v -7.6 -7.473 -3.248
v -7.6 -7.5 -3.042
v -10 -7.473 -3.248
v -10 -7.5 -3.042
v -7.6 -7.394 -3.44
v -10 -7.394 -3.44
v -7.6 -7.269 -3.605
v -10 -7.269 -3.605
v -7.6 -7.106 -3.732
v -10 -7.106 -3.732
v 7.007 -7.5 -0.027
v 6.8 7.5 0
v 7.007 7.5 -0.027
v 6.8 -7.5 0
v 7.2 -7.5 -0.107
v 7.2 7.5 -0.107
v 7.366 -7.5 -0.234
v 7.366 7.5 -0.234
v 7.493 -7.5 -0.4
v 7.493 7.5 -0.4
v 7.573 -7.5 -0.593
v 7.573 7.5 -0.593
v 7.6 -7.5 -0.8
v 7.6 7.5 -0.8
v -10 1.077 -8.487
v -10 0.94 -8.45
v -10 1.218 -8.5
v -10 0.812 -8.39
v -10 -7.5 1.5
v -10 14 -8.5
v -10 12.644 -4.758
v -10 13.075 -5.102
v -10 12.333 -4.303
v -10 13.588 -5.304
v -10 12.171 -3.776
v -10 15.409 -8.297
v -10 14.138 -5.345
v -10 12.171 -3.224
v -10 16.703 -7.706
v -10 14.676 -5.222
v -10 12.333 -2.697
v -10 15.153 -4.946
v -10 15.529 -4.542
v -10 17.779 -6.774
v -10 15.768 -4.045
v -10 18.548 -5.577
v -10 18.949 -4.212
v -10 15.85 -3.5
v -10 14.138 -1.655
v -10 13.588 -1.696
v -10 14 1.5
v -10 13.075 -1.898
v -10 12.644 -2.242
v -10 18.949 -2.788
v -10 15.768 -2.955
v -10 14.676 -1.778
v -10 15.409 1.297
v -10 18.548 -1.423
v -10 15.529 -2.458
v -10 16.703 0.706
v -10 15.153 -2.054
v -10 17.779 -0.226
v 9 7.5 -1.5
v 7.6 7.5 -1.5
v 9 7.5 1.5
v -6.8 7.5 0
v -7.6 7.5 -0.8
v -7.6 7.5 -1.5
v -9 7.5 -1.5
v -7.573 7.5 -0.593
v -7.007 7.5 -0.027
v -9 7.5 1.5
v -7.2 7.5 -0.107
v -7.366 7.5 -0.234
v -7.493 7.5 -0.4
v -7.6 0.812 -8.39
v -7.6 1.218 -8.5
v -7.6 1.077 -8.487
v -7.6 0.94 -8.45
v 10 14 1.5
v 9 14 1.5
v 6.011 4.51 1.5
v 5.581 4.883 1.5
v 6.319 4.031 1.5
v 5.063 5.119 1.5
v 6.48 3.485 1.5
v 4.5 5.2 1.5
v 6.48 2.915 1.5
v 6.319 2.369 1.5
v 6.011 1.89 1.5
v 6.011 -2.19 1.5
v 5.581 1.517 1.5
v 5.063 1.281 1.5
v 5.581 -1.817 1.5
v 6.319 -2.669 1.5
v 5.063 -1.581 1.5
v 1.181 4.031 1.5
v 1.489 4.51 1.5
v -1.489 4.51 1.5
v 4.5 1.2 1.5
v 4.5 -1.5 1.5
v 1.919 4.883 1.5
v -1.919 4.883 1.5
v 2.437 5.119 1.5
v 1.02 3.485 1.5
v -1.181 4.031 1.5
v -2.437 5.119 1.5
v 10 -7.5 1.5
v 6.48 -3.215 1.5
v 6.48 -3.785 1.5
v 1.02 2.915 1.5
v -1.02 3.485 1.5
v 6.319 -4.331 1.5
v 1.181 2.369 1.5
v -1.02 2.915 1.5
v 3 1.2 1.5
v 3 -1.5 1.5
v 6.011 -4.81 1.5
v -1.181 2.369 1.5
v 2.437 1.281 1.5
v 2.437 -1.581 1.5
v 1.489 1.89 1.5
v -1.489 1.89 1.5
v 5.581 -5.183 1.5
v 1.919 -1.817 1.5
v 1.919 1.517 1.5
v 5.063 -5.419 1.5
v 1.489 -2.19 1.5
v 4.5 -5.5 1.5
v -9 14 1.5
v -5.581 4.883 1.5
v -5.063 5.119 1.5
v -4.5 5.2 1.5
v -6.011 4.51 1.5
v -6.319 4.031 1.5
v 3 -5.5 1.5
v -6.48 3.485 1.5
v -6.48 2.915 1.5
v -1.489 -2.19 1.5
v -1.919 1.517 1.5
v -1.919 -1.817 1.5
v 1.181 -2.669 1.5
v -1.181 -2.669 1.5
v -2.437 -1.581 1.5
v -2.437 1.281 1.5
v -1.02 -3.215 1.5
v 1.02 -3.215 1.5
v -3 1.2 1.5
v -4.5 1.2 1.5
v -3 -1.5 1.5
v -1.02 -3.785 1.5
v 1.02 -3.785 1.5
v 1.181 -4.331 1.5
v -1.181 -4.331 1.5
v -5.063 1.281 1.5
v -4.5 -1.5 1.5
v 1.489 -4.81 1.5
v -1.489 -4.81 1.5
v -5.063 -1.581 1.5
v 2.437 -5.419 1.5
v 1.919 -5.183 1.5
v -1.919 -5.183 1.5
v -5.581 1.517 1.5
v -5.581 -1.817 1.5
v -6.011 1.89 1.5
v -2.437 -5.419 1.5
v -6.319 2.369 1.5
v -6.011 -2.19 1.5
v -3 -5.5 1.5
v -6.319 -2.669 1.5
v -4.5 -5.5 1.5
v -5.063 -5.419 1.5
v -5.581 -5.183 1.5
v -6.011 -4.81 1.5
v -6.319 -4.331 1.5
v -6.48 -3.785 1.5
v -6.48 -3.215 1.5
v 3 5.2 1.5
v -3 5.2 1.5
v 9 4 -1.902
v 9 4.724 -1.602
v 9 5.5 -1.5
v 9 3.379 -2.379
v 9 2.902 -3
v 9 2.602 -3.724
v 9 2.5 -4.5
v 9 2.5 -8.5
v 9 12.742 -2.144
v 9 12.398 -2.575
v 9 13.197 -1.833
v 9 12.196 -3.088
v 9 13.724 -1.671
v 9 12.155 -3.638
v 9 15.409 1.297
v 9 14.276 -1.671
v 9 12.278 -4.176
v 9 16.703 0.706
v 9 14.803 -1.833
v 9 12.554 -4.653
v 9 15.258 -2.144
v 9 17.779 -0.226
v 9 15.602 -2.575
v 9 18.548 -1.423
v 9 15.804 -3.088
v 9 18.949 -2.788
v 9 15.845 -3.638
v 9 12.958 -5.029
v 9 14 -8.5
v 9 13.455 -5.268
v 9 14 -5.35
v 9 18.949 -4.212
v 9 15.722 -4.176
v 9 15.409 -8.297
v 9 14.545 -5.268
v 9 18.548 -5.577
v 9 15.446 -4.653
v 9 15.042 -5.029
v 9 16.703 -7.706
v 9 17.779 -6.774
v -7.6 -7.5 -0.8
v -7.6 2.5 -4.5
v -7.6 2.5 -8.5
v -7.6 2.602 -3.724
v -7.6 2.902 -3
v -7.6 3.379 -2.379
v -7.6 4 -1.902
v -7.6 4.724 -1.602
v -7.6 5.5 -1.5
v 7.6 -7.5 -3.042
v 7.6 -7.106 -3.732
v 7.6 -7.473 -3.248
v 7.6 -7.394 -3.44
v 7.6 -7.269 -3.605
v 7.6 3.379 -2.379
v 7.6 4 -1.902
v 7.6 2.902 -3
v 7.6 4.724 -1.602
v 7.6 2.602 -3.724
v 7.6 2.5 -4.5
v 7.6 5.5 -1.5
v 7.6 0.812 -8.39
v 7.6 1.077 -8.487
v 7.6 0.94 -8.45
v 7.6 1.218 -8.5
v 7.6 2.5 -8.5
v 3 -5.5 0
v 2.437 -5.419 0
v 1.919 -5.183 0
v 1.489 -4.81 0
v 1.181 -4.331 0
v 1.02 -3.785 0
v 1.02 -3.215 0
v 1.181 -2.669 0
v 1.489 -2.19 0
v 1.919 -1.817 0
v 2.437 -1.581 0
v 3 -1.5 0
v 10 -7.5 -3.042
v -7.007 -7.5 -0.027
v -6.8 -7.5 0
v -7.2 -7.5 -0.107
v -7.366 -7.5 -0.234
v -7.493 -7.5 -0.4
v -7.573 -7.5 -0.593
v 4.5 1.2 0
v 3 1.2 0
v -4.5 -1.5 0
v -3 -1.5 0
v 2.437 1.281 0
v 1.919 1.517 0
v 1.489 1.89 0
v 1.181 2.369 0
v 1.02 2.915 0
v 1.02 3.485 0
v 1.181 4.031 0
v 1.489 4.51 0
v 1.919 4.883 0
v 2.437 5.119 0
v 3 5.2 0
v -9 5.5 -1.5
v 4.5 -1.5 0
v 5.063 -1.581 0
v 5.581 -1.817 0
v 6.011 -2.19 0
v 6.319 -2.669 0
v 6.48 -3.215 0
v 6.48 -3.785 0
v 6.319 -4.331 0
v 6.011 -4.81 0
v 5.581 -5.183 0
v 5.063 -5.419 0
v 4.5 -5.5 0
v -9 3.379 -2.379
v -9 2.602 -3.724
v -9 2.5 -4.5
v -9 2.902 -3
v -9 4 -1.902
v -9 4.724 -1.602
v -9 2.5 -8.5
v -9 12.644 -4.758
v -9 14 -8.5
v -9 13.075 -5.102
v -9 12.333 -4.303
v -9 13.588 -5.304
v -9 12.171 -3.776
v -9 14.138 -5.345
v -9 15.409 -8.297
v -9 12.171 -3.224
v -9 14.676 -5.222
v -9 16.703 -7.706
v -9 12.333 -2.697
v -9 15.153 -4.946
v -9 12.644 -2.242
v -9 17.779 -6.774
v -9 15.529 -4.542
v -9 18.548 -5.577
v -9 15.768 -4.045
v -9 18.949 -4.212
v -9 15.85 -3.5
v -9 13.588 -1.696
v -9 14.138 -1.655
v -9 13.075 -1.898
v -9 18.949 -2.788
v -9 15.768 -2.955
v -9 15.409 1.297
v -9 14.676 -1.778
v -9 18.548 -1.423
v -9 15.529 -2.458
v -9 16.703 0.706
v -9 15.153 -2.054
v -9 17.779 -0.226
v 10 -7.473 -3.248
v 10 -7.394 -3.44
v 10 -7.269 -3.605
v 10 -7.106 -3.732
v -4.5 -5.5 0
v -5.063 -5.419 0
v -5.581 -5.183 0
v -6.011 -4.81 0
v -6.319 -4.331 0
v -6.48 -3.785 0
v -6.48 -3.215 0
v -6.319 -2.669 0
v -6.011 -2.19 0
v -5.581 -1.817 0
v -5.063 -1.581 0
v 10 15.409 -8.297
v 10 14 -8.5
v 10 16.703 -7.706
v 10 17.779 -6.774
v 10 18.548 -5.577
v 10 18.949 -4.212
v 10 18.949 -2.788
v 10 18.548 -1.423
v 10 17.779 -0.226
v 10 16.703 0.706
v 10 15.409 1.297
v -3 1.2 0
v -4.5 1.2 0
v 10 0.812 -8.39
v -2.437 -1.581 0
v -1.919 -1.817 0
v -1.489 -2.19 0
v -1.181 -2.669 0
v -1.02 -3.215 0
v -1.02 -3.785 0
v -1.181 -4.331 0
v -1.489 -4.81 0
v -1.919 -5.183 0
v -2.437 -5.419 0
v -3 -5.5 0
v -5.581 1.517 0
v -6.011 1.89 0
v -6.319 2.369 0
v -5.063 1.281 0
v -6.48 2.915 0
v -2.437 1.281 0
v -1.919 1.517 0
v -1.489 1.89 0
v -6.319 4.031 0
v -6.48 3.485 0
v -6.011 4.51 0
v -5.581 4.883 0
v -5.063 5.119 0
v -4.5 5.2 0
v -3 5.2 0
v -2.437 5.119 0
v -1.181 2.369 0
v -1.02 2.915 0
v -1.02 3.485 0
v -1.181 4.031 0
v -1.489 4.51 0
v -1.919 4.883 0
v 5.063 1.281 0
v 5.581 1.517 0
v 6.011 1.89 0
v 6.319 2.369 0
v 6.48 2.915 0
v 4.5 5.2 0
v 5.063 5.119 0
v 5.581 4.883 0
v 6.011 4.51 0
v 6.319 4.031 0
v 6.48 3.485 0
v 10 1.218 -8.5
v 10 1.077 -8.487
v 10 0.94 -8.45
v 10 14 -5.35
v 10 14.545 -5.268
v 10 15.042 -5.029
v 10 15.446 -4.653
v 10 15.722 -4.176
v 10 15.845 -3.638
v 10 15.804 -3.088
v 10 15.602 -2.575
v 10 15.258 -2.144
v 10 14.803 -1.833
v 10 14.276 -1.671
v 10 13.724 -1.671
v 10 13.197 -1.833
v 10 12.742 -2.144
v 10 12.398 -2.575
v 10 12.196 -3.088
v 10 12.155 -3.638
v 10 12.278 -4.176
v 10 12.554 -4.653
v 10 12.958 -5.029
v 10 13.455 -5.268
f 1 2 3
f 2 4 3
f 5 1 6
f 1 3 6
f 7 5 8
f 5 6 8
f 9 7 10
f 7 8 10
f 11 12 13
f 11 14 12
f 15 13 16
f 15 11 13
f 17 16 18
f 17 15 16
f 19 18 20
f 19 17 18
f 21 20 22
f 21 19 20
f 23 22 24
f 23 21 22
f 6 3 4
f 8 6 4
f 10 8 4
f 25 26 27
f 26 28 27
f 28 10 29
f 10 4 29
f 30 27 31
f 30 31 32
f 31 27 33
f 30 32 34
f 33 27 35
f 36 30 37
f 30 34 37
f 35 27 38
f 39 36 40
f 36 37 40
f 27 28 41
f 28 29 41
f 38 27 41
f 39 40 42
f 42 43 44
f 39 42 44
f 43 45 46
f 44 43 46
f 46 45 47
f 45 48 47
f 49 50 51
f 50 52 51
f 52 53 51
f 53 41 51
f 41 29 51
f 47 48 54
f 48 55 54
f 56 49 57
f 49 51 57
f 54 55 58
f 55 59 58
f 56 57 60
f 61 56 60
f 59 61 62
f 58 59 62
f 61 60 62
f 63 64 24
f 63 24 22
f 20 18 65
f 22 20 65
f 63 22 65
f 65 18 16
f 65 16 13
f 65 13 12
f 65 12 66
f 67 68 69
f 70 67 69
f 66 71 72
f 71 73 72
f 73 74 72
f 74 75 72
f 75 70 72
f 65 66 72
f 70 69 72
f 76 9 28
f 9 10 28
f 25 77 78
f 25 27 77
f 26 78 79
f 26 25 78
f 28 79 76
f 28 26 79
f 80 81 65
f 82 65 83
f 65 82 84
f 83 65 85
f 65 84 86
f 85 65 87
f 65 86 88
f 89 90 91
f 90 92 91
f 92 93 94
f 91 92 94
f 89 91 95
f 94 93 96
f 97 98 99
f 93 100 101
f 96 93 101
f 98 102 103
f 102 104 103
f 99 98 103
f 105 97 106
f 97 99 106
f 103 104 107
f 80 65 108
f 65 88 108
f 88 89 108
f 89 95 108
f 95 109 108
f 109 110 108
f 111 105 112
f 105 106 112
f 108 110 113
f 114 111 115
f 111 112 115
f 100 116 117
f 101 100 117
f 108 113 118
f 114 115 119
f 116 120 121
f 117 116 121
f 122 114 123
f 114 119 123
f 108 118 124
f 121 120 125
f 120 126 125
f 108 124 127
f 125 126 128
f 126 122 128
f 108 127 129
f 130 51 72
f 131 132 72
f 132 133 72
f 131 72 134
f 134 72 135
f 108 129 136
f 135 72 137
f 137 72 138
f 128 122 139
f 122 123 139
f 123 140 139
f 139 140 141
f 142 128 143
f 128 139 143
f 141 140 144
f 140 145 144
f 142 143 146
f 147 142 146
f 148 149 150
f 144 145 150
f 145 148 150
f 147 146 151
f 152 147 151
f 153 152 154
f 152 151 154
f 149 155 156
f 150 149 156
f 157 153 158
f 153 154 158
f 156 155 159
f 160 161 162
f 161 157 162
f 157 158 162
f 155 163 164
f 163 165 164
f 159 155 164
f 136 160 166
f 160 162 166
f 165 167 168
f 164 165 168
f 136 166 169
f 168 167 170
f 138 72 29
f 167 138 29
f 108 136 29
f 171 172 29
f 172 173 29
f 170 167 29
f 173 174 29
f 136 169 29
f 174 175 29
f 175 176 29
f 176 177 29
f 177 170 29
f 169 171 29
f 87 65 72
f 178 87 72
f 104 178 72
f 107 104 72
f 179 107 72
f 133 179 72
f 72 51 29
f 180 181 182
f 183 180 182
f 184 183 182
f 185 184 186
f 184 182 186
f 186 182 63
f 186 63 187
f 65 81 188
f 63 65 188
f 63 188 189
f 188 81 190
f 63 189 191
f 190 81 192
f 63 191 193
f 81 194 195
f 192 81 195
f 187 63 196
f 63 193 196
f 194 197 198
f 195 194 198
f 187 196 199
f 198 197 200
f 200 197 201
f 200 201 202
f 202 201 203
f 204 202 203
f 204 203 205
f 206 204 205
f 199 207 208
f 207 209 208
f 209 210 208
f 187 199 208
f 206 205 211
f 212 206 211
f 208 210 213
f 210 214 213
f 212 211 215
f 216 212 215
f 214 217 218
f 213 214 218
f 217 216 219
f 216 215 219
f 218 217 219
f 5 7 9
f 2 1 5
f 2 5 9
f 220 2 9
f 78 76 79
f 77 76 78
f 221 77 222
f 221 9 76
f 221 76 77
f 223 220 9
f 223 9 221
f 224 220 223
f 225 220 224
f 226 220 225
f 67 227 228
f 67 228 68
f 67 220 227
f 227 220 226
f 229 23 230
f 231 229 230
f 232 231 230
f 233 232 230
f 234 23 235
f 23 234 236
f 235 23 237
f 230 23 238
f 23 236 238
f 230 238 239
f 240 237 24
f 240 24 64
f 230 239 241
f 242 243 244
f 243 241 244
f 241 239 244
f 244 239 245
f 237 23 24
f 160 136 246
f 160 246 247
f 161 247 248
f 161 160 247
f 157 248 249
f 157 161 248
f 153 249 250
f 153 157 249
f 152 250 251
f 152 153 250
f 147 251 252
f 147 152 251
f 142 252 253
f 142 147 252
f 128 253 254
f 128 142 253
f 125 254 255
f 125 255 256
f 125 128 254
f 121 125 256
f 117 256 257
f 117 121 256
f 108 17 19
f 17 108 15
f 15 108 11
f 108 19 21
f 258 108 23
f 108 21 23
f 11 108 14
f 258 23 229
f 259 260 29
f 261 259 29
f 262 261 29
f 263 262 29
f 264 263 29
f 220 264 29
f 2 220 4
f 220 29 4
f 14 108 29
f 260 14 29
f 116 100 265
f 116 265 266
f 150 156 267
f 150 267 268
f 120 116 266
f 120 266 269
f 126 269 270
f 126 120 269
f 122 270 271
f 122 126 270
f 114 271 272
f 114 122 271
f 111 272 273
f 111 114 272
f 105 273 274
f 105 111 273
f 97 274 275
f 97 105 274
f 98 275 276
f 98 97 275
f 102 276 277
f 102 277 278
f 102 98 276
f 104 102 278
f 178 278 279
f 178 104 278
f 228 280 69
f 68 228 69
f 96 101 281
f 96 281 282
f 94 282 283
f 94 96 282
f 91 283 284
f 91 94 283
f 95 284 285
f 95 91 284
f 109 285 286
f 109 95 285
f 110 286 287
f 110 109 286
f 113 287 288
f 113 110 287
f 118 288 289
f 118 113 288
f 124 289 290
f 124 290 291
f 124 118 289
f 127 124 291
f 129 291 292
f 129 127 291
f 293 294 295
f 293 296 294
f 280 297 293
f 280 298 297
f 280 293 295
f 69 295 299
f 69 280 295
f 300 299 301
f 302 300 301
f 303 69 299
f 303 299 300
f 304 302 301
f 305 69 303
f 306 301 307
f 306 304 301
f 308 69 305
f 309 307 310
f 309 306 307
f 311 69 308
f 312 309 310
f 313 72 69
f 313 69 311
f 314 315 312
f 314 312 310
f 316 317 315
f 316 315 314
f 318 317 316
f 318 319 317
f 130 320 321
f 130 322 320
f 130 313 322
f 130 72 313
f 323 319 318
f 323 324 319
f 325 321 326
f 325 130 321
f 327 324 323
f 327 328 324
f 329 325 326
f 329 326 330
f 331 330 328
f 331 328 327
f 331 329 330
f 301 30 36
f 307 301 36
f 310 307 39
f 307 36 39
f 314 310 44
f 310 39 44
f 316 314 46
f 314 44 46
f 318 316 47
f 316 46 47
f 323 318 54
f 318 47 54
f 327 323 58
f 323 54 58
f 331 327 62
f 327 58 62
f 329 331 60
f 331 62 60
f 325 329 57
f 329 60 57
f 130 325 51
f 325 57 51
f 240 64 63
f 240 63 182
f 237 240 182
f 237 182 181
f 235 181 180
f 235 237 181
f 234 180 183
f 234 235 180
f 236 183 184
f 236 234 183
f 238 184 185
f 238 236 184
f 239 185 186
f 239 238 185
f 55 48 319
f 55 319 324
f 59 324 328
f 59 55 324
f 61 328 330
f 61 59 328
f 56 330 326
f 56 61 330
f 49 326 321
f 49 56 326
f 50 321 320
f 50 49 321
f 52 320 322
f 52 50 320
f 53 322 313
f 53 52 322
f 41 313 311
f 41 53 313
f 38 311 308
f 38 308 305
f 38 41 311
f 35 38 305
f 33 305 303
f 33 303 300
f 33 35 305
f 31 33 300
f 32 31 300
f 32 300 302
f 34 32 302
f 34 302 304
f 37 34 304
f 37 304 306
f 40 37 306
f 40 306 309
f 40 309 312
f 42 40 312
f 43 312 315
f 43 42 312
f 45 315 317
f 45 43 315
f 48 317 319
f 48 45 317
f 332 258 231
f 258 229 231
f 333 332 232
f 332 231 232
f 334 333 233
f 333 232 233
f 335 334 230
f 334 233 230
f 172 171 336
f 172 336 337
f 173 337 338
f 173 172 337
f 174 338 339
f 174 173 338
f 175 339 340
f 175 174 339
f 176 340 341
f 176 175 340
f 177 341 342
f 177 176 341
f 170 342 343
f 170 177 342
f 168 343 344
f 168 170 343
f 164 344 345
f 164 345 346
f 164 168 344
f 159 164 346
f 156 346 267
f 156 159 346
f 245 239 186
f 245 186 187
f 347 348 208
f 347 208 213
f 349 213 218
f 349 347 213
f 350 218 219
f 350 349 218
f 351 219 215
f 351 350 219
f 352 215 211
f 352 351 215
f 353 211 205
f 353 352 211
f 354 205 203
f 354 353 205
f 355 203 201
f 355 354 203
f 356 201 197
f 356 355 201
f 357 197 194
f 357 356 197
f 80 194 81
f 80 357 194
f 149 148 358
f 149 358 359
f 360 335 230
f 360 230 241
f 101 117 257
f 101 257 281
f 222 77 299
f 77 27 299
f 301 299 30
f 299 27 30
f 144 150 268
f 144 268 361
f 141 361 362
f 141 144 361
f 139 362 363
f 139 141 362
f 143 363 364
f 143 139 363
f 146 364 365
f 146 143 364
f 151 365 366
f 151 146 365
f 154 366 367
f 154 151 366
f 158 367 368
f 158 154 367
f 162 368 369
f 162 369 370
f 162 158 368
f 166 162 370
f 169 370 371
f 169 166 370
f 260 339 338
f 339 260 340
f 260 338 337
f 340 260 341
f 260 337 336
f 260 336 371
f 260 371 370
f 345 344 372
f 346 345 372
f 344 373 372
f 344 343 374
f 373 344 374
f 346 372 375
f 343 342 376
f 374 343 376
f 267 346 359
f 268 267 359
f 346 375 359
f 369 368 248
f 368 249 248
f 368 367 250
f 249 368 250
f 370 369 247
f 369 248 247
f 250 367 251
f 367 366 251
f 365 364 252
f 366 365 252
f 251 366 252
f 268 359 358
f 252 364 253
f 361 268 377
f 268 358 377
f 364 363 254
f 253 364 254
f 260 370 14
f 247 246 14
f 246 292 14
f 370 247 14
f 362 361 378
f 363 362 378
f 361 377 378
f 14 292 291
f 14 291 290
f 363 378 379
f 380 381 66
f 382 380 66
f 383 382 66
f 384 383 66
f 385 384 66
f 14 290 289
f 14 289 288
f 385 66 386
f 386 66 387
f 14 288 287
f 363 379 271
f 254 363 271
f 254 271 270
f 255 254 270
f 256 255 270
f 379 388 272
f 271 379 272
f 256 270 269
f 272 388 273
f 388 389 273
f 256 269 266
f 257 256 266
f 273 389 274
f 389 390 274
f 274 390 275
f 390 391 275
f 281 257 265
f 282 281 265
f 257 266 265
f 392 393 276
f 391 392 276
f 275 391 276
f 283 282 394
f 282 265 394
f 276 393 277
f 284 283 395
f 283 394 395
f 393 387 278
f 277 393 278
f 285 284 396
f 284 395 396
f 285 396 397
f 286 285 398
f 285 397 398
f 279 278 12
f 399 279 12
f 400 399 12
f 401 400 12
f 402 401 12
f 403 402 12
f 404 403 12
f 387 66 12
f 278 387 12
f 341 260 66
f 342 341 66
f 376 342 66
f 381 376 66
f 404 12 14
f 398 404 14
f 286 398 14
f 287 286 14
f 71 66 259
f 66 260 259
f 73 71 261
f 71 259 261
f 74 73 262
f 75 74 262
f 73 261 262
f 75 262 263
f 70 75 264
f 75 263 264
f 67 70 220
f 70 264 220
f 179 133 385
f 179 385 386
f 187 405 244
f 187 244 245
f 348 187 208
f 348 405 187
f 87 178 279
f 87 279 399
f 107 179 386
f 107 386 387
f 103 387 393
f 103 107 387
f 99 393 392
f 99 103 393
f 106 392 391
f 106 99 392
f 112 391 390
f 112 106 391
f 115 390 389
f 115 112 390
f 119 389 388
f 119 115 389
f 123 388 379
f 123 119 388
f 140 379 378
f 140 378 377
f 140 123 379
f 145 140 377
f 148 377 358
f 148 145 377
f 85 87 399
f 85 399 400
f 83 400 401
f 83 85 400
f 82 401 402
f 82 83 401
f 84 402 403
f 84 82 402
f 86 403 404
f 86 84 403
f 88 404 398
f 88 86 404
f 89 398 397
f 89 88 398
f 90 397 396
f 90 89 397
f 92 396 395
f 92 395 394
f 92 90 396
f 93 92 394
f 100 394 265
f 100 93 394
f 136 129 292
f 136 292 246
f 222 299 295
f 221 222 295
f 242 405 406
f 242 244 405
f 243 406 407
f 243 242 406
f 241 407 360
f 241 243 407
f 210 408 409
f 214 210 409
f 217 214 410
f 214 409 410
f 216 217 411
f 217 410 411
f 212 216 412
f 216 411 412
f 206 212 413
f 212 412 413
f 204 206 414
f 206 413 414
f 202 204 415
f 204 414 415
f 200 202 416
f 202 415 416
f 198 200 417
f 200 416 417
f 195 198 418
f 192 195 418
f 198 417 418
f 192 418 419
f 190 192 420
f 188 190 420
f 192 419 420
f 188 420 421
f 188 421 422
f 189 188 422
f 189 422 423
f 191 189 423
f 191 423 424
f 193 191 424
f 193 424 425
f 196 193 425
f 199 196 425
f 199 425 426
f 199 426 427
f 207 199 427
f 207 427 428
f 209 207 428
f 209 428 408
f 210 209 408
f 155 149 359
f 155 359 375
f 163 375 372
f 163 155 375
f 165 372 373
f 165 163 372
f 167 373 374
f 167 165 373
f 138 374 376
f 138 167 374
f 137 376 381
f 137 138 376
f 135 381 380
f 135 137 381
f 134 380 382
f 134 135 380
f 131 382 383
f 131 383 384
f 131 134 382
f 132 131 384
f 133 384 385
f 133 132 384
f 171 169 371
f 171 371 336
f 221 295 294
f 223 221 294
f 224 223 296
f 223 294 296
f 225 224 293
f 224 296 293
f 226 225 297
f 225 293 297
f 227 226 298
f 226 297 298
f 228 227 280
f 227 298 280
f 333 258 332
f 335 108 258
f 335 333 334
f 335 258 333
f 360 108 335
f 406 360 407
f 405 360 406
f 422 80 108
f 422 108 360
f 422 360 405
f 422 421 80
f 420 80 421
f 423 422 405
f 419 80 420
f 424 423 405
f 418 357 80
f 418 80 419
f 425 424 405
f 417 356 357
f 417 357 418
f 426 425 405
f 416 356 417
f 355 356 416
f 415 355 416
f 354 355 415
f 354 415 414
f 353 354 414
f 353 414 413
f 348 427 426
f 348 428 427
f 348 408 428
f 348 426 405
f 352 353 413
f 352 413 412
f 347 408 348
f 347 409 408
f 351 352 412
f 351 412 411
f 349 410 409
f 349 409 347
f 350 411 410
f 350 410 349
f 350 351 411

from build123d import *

# Parameters (mm, degrees)
SKETCH1_W           = 20
SKETCH1_H           = 15
BOSS_EXTRUDE1_DEPTH = 1.5
SKETCH2_R           = 1.85
BOSS_EXTRUDE2_DEPTH = 2.4
CUT_EXTRUDE1_DEPTH  = 1.4
MIRROR1_START       = -10
MIRROR1_OUTLINE_R   = 1.85
MIRROR1_DEPTH       = 1
MIRROR1_START_2     = -9
MIRROR1_2_DEPTH     = 1.4
FILLET1_R           = 0.8
CUT_EXTRUDE2_DEPTH  = 1.5


# Read off the part's stored shape, not the designer's step: Mirror1
with BuildPart() as part:
    # Sketch1 → Boss-Extrude1 (new body)
    with BuildSketch(Plane.XY):
        Rectangle(SKETCH1_W, SKETCH1_H)
    extrude(amount=BOSS_EXTRUDE1_DEPTH)

    # Sketch2 → Boss-Extrude2 (add)
    with BuildSketch(Plane(origin=(10, 0, 0), x_dir=(0, 0, -1), z_dir=(1, 0, 0))):
        with BuildLine():
            Line((0, 7.5), (0, -7.5))
            Line((0, -7.5), (3.5, -7.5))
            Line((3.5, -7.5), (8.5, 1))
            Line((8.5, 1), (8.5, 14))
            ThreePointArc((8.5, 14), (3.5, 19), (-1.5, 14))
            Line((-1.5, 14), (-1.5, 7.5))
            Line((-1.5, 7.5), (0, 7.5))
        make_face()
        with Locations((3.5, 14)):
            Circle(SKETCH2_R, mode=Mode.SUBTRACT)
    extrude(amount=-BOSS_EXTRUDE2_DEPTH)

    # Sketch3 → Cut-Extrude1 (cut)
    with BuildSketch(Plane.ZY.offset(-7.6)):
        with BuildLine():
            Line((1.5, 7.5), (-1.5, 7.5))
            Line((-1.5, 7.5), (-1.5, 5.5))
            ThreePointArc((-1.5, 5.5), (-2.378679656, 3.378679656), (-4.5, 2.5))
            Line((-4.5, 2.5), (-8.5, 2.5))
            Line((-8.5, 2.5), (-8.5, 19.043681707))
            Line((-8.5, 19.043681707), (1.5, 19.043681707))
            Line((1.5, 19.043681707), (1.5, 7.5))
        make_face()
    extrude(amount=-CUT_EXTRUDE1_DEPTH, mode=Mode.SUBTRACT)

    # Mirror1 outline → Mirror1 (add)
    with BuildSketch(Plane.YZ.offset(MIRROR1_START)):
        with BuildLine():
            ThreePointArc((14, -8.5), (19, -3.5), (14, 1.5))
            Line((14, 1.5), (7.5, 1.5))
            Line((7.5, 1.5), (7.5, 0))
            Line((7.5, 0), (-7.5, 0))
            Line((-7.5, 0), (-7.5, -3.5))
            Line((-7.5, -3.5), (1, -8.5))
            Line((1, -8.5), (14, -8.5))
        make_face()
        with Locations((14, -3.5)):
            Circle(MIRROR1_OUTLINE_R, mode=Mode.SUBTRACT)
    extrude(amount=MIRROR1_DEPTH)

    # Mirror1 2 outline → Mirror1 2 (add)
    with BuildSketch(Plane.YZ.offset(MIRROR1_START_2)):
        with BuildLine():
            Line((1, -8.5), (2.5, -8.5))
            Line((2.5, -8.5), (2.5, -4.5))
            ThreePointArc((2.5, -4.5), (3.378679656, -2.378679656), (5.5, -1.5))
            Line((5.5, -1.5), (7.5, -1.5))
            Line((7.5, -1.5), (7.5, 0))
            Line((7.5, 0), (-7.5, 0))
            Line((-7.5, 0), (-7.5, -3.5))
            Line((-7.5, -3.5), (1, -8.5))
        make_face()
    extrude(amount=MIRROR1_2_DEPTH)

    # Fillet1
    fillet1_edges = [part.edges().sort_by_distance(p)[0] for p in [
        (8.8, 1, -8.5),
        (8.8, -7.5, -3.5),
        (7.6, 0, 0),
        (-8.8, 1, -8.5),
        (-7.6, 0, 0),
        (-8.8, -7.5, -3.5),
    ]]
    fillet(fillet1_edges, radius=FILLET1_R)

    # Sketch4 → Cut-Extrude2 (cut)
    with BuildSketch(Plane.XY.offset(1.5)):
        with BuildLine():
            Line((-4.5, 5.2), (-3, 5.2))
            ThreePointArc((-3, 5.2), (-1, 3.2), (-3, 1.2))
            Line((-3, 1.2), (-4.5, 1.2))
            ThreePointArc((-4.5, 1.2), (-6.5, 3.2), (-4.5, 5.2))
        make_face()
        with BuildLine():
            Line((3, 5.2), (4.5, 5.2))
            ThreePointArc((4.5, 5.2), (6.5, 3.2), (4.5, 1.2))
            Line((4.5, 1.2), (3, 1.2))
            ThreePointArc((3, 1.2), (1, 3.2), (3, 5.2))
        make_face()
        with BuildLine():
            Line((-4.5, -1.5), (-3, -1.5))
            ThreePointArc((-3, -1.5), (-1, -3.5), (-3, -5.5))
            Line((-3, -5.5), (-4.5, -5.5))
            ThreePointArc((-4.5, -5.5), (-6.5, -3.5), (-4.5, -1.5))
        make_face()
        with BuildLine():
            Line((3, -1.5), (4.5, -1.5))
            ThreePointArc((4.5, -1.5), (6.5, -3.5), (4.5, -5.5))
            Line((4.5, -5.5), (3, -5.5))
            ThreePointArc((3, -5.5), (1, -3.5), (3, -1.5))
        make_face()
    extrude(amount=-CUT_EXTRUDE2_DEPTH, mode=Mode.SUBTRACT)


solid = part.part
